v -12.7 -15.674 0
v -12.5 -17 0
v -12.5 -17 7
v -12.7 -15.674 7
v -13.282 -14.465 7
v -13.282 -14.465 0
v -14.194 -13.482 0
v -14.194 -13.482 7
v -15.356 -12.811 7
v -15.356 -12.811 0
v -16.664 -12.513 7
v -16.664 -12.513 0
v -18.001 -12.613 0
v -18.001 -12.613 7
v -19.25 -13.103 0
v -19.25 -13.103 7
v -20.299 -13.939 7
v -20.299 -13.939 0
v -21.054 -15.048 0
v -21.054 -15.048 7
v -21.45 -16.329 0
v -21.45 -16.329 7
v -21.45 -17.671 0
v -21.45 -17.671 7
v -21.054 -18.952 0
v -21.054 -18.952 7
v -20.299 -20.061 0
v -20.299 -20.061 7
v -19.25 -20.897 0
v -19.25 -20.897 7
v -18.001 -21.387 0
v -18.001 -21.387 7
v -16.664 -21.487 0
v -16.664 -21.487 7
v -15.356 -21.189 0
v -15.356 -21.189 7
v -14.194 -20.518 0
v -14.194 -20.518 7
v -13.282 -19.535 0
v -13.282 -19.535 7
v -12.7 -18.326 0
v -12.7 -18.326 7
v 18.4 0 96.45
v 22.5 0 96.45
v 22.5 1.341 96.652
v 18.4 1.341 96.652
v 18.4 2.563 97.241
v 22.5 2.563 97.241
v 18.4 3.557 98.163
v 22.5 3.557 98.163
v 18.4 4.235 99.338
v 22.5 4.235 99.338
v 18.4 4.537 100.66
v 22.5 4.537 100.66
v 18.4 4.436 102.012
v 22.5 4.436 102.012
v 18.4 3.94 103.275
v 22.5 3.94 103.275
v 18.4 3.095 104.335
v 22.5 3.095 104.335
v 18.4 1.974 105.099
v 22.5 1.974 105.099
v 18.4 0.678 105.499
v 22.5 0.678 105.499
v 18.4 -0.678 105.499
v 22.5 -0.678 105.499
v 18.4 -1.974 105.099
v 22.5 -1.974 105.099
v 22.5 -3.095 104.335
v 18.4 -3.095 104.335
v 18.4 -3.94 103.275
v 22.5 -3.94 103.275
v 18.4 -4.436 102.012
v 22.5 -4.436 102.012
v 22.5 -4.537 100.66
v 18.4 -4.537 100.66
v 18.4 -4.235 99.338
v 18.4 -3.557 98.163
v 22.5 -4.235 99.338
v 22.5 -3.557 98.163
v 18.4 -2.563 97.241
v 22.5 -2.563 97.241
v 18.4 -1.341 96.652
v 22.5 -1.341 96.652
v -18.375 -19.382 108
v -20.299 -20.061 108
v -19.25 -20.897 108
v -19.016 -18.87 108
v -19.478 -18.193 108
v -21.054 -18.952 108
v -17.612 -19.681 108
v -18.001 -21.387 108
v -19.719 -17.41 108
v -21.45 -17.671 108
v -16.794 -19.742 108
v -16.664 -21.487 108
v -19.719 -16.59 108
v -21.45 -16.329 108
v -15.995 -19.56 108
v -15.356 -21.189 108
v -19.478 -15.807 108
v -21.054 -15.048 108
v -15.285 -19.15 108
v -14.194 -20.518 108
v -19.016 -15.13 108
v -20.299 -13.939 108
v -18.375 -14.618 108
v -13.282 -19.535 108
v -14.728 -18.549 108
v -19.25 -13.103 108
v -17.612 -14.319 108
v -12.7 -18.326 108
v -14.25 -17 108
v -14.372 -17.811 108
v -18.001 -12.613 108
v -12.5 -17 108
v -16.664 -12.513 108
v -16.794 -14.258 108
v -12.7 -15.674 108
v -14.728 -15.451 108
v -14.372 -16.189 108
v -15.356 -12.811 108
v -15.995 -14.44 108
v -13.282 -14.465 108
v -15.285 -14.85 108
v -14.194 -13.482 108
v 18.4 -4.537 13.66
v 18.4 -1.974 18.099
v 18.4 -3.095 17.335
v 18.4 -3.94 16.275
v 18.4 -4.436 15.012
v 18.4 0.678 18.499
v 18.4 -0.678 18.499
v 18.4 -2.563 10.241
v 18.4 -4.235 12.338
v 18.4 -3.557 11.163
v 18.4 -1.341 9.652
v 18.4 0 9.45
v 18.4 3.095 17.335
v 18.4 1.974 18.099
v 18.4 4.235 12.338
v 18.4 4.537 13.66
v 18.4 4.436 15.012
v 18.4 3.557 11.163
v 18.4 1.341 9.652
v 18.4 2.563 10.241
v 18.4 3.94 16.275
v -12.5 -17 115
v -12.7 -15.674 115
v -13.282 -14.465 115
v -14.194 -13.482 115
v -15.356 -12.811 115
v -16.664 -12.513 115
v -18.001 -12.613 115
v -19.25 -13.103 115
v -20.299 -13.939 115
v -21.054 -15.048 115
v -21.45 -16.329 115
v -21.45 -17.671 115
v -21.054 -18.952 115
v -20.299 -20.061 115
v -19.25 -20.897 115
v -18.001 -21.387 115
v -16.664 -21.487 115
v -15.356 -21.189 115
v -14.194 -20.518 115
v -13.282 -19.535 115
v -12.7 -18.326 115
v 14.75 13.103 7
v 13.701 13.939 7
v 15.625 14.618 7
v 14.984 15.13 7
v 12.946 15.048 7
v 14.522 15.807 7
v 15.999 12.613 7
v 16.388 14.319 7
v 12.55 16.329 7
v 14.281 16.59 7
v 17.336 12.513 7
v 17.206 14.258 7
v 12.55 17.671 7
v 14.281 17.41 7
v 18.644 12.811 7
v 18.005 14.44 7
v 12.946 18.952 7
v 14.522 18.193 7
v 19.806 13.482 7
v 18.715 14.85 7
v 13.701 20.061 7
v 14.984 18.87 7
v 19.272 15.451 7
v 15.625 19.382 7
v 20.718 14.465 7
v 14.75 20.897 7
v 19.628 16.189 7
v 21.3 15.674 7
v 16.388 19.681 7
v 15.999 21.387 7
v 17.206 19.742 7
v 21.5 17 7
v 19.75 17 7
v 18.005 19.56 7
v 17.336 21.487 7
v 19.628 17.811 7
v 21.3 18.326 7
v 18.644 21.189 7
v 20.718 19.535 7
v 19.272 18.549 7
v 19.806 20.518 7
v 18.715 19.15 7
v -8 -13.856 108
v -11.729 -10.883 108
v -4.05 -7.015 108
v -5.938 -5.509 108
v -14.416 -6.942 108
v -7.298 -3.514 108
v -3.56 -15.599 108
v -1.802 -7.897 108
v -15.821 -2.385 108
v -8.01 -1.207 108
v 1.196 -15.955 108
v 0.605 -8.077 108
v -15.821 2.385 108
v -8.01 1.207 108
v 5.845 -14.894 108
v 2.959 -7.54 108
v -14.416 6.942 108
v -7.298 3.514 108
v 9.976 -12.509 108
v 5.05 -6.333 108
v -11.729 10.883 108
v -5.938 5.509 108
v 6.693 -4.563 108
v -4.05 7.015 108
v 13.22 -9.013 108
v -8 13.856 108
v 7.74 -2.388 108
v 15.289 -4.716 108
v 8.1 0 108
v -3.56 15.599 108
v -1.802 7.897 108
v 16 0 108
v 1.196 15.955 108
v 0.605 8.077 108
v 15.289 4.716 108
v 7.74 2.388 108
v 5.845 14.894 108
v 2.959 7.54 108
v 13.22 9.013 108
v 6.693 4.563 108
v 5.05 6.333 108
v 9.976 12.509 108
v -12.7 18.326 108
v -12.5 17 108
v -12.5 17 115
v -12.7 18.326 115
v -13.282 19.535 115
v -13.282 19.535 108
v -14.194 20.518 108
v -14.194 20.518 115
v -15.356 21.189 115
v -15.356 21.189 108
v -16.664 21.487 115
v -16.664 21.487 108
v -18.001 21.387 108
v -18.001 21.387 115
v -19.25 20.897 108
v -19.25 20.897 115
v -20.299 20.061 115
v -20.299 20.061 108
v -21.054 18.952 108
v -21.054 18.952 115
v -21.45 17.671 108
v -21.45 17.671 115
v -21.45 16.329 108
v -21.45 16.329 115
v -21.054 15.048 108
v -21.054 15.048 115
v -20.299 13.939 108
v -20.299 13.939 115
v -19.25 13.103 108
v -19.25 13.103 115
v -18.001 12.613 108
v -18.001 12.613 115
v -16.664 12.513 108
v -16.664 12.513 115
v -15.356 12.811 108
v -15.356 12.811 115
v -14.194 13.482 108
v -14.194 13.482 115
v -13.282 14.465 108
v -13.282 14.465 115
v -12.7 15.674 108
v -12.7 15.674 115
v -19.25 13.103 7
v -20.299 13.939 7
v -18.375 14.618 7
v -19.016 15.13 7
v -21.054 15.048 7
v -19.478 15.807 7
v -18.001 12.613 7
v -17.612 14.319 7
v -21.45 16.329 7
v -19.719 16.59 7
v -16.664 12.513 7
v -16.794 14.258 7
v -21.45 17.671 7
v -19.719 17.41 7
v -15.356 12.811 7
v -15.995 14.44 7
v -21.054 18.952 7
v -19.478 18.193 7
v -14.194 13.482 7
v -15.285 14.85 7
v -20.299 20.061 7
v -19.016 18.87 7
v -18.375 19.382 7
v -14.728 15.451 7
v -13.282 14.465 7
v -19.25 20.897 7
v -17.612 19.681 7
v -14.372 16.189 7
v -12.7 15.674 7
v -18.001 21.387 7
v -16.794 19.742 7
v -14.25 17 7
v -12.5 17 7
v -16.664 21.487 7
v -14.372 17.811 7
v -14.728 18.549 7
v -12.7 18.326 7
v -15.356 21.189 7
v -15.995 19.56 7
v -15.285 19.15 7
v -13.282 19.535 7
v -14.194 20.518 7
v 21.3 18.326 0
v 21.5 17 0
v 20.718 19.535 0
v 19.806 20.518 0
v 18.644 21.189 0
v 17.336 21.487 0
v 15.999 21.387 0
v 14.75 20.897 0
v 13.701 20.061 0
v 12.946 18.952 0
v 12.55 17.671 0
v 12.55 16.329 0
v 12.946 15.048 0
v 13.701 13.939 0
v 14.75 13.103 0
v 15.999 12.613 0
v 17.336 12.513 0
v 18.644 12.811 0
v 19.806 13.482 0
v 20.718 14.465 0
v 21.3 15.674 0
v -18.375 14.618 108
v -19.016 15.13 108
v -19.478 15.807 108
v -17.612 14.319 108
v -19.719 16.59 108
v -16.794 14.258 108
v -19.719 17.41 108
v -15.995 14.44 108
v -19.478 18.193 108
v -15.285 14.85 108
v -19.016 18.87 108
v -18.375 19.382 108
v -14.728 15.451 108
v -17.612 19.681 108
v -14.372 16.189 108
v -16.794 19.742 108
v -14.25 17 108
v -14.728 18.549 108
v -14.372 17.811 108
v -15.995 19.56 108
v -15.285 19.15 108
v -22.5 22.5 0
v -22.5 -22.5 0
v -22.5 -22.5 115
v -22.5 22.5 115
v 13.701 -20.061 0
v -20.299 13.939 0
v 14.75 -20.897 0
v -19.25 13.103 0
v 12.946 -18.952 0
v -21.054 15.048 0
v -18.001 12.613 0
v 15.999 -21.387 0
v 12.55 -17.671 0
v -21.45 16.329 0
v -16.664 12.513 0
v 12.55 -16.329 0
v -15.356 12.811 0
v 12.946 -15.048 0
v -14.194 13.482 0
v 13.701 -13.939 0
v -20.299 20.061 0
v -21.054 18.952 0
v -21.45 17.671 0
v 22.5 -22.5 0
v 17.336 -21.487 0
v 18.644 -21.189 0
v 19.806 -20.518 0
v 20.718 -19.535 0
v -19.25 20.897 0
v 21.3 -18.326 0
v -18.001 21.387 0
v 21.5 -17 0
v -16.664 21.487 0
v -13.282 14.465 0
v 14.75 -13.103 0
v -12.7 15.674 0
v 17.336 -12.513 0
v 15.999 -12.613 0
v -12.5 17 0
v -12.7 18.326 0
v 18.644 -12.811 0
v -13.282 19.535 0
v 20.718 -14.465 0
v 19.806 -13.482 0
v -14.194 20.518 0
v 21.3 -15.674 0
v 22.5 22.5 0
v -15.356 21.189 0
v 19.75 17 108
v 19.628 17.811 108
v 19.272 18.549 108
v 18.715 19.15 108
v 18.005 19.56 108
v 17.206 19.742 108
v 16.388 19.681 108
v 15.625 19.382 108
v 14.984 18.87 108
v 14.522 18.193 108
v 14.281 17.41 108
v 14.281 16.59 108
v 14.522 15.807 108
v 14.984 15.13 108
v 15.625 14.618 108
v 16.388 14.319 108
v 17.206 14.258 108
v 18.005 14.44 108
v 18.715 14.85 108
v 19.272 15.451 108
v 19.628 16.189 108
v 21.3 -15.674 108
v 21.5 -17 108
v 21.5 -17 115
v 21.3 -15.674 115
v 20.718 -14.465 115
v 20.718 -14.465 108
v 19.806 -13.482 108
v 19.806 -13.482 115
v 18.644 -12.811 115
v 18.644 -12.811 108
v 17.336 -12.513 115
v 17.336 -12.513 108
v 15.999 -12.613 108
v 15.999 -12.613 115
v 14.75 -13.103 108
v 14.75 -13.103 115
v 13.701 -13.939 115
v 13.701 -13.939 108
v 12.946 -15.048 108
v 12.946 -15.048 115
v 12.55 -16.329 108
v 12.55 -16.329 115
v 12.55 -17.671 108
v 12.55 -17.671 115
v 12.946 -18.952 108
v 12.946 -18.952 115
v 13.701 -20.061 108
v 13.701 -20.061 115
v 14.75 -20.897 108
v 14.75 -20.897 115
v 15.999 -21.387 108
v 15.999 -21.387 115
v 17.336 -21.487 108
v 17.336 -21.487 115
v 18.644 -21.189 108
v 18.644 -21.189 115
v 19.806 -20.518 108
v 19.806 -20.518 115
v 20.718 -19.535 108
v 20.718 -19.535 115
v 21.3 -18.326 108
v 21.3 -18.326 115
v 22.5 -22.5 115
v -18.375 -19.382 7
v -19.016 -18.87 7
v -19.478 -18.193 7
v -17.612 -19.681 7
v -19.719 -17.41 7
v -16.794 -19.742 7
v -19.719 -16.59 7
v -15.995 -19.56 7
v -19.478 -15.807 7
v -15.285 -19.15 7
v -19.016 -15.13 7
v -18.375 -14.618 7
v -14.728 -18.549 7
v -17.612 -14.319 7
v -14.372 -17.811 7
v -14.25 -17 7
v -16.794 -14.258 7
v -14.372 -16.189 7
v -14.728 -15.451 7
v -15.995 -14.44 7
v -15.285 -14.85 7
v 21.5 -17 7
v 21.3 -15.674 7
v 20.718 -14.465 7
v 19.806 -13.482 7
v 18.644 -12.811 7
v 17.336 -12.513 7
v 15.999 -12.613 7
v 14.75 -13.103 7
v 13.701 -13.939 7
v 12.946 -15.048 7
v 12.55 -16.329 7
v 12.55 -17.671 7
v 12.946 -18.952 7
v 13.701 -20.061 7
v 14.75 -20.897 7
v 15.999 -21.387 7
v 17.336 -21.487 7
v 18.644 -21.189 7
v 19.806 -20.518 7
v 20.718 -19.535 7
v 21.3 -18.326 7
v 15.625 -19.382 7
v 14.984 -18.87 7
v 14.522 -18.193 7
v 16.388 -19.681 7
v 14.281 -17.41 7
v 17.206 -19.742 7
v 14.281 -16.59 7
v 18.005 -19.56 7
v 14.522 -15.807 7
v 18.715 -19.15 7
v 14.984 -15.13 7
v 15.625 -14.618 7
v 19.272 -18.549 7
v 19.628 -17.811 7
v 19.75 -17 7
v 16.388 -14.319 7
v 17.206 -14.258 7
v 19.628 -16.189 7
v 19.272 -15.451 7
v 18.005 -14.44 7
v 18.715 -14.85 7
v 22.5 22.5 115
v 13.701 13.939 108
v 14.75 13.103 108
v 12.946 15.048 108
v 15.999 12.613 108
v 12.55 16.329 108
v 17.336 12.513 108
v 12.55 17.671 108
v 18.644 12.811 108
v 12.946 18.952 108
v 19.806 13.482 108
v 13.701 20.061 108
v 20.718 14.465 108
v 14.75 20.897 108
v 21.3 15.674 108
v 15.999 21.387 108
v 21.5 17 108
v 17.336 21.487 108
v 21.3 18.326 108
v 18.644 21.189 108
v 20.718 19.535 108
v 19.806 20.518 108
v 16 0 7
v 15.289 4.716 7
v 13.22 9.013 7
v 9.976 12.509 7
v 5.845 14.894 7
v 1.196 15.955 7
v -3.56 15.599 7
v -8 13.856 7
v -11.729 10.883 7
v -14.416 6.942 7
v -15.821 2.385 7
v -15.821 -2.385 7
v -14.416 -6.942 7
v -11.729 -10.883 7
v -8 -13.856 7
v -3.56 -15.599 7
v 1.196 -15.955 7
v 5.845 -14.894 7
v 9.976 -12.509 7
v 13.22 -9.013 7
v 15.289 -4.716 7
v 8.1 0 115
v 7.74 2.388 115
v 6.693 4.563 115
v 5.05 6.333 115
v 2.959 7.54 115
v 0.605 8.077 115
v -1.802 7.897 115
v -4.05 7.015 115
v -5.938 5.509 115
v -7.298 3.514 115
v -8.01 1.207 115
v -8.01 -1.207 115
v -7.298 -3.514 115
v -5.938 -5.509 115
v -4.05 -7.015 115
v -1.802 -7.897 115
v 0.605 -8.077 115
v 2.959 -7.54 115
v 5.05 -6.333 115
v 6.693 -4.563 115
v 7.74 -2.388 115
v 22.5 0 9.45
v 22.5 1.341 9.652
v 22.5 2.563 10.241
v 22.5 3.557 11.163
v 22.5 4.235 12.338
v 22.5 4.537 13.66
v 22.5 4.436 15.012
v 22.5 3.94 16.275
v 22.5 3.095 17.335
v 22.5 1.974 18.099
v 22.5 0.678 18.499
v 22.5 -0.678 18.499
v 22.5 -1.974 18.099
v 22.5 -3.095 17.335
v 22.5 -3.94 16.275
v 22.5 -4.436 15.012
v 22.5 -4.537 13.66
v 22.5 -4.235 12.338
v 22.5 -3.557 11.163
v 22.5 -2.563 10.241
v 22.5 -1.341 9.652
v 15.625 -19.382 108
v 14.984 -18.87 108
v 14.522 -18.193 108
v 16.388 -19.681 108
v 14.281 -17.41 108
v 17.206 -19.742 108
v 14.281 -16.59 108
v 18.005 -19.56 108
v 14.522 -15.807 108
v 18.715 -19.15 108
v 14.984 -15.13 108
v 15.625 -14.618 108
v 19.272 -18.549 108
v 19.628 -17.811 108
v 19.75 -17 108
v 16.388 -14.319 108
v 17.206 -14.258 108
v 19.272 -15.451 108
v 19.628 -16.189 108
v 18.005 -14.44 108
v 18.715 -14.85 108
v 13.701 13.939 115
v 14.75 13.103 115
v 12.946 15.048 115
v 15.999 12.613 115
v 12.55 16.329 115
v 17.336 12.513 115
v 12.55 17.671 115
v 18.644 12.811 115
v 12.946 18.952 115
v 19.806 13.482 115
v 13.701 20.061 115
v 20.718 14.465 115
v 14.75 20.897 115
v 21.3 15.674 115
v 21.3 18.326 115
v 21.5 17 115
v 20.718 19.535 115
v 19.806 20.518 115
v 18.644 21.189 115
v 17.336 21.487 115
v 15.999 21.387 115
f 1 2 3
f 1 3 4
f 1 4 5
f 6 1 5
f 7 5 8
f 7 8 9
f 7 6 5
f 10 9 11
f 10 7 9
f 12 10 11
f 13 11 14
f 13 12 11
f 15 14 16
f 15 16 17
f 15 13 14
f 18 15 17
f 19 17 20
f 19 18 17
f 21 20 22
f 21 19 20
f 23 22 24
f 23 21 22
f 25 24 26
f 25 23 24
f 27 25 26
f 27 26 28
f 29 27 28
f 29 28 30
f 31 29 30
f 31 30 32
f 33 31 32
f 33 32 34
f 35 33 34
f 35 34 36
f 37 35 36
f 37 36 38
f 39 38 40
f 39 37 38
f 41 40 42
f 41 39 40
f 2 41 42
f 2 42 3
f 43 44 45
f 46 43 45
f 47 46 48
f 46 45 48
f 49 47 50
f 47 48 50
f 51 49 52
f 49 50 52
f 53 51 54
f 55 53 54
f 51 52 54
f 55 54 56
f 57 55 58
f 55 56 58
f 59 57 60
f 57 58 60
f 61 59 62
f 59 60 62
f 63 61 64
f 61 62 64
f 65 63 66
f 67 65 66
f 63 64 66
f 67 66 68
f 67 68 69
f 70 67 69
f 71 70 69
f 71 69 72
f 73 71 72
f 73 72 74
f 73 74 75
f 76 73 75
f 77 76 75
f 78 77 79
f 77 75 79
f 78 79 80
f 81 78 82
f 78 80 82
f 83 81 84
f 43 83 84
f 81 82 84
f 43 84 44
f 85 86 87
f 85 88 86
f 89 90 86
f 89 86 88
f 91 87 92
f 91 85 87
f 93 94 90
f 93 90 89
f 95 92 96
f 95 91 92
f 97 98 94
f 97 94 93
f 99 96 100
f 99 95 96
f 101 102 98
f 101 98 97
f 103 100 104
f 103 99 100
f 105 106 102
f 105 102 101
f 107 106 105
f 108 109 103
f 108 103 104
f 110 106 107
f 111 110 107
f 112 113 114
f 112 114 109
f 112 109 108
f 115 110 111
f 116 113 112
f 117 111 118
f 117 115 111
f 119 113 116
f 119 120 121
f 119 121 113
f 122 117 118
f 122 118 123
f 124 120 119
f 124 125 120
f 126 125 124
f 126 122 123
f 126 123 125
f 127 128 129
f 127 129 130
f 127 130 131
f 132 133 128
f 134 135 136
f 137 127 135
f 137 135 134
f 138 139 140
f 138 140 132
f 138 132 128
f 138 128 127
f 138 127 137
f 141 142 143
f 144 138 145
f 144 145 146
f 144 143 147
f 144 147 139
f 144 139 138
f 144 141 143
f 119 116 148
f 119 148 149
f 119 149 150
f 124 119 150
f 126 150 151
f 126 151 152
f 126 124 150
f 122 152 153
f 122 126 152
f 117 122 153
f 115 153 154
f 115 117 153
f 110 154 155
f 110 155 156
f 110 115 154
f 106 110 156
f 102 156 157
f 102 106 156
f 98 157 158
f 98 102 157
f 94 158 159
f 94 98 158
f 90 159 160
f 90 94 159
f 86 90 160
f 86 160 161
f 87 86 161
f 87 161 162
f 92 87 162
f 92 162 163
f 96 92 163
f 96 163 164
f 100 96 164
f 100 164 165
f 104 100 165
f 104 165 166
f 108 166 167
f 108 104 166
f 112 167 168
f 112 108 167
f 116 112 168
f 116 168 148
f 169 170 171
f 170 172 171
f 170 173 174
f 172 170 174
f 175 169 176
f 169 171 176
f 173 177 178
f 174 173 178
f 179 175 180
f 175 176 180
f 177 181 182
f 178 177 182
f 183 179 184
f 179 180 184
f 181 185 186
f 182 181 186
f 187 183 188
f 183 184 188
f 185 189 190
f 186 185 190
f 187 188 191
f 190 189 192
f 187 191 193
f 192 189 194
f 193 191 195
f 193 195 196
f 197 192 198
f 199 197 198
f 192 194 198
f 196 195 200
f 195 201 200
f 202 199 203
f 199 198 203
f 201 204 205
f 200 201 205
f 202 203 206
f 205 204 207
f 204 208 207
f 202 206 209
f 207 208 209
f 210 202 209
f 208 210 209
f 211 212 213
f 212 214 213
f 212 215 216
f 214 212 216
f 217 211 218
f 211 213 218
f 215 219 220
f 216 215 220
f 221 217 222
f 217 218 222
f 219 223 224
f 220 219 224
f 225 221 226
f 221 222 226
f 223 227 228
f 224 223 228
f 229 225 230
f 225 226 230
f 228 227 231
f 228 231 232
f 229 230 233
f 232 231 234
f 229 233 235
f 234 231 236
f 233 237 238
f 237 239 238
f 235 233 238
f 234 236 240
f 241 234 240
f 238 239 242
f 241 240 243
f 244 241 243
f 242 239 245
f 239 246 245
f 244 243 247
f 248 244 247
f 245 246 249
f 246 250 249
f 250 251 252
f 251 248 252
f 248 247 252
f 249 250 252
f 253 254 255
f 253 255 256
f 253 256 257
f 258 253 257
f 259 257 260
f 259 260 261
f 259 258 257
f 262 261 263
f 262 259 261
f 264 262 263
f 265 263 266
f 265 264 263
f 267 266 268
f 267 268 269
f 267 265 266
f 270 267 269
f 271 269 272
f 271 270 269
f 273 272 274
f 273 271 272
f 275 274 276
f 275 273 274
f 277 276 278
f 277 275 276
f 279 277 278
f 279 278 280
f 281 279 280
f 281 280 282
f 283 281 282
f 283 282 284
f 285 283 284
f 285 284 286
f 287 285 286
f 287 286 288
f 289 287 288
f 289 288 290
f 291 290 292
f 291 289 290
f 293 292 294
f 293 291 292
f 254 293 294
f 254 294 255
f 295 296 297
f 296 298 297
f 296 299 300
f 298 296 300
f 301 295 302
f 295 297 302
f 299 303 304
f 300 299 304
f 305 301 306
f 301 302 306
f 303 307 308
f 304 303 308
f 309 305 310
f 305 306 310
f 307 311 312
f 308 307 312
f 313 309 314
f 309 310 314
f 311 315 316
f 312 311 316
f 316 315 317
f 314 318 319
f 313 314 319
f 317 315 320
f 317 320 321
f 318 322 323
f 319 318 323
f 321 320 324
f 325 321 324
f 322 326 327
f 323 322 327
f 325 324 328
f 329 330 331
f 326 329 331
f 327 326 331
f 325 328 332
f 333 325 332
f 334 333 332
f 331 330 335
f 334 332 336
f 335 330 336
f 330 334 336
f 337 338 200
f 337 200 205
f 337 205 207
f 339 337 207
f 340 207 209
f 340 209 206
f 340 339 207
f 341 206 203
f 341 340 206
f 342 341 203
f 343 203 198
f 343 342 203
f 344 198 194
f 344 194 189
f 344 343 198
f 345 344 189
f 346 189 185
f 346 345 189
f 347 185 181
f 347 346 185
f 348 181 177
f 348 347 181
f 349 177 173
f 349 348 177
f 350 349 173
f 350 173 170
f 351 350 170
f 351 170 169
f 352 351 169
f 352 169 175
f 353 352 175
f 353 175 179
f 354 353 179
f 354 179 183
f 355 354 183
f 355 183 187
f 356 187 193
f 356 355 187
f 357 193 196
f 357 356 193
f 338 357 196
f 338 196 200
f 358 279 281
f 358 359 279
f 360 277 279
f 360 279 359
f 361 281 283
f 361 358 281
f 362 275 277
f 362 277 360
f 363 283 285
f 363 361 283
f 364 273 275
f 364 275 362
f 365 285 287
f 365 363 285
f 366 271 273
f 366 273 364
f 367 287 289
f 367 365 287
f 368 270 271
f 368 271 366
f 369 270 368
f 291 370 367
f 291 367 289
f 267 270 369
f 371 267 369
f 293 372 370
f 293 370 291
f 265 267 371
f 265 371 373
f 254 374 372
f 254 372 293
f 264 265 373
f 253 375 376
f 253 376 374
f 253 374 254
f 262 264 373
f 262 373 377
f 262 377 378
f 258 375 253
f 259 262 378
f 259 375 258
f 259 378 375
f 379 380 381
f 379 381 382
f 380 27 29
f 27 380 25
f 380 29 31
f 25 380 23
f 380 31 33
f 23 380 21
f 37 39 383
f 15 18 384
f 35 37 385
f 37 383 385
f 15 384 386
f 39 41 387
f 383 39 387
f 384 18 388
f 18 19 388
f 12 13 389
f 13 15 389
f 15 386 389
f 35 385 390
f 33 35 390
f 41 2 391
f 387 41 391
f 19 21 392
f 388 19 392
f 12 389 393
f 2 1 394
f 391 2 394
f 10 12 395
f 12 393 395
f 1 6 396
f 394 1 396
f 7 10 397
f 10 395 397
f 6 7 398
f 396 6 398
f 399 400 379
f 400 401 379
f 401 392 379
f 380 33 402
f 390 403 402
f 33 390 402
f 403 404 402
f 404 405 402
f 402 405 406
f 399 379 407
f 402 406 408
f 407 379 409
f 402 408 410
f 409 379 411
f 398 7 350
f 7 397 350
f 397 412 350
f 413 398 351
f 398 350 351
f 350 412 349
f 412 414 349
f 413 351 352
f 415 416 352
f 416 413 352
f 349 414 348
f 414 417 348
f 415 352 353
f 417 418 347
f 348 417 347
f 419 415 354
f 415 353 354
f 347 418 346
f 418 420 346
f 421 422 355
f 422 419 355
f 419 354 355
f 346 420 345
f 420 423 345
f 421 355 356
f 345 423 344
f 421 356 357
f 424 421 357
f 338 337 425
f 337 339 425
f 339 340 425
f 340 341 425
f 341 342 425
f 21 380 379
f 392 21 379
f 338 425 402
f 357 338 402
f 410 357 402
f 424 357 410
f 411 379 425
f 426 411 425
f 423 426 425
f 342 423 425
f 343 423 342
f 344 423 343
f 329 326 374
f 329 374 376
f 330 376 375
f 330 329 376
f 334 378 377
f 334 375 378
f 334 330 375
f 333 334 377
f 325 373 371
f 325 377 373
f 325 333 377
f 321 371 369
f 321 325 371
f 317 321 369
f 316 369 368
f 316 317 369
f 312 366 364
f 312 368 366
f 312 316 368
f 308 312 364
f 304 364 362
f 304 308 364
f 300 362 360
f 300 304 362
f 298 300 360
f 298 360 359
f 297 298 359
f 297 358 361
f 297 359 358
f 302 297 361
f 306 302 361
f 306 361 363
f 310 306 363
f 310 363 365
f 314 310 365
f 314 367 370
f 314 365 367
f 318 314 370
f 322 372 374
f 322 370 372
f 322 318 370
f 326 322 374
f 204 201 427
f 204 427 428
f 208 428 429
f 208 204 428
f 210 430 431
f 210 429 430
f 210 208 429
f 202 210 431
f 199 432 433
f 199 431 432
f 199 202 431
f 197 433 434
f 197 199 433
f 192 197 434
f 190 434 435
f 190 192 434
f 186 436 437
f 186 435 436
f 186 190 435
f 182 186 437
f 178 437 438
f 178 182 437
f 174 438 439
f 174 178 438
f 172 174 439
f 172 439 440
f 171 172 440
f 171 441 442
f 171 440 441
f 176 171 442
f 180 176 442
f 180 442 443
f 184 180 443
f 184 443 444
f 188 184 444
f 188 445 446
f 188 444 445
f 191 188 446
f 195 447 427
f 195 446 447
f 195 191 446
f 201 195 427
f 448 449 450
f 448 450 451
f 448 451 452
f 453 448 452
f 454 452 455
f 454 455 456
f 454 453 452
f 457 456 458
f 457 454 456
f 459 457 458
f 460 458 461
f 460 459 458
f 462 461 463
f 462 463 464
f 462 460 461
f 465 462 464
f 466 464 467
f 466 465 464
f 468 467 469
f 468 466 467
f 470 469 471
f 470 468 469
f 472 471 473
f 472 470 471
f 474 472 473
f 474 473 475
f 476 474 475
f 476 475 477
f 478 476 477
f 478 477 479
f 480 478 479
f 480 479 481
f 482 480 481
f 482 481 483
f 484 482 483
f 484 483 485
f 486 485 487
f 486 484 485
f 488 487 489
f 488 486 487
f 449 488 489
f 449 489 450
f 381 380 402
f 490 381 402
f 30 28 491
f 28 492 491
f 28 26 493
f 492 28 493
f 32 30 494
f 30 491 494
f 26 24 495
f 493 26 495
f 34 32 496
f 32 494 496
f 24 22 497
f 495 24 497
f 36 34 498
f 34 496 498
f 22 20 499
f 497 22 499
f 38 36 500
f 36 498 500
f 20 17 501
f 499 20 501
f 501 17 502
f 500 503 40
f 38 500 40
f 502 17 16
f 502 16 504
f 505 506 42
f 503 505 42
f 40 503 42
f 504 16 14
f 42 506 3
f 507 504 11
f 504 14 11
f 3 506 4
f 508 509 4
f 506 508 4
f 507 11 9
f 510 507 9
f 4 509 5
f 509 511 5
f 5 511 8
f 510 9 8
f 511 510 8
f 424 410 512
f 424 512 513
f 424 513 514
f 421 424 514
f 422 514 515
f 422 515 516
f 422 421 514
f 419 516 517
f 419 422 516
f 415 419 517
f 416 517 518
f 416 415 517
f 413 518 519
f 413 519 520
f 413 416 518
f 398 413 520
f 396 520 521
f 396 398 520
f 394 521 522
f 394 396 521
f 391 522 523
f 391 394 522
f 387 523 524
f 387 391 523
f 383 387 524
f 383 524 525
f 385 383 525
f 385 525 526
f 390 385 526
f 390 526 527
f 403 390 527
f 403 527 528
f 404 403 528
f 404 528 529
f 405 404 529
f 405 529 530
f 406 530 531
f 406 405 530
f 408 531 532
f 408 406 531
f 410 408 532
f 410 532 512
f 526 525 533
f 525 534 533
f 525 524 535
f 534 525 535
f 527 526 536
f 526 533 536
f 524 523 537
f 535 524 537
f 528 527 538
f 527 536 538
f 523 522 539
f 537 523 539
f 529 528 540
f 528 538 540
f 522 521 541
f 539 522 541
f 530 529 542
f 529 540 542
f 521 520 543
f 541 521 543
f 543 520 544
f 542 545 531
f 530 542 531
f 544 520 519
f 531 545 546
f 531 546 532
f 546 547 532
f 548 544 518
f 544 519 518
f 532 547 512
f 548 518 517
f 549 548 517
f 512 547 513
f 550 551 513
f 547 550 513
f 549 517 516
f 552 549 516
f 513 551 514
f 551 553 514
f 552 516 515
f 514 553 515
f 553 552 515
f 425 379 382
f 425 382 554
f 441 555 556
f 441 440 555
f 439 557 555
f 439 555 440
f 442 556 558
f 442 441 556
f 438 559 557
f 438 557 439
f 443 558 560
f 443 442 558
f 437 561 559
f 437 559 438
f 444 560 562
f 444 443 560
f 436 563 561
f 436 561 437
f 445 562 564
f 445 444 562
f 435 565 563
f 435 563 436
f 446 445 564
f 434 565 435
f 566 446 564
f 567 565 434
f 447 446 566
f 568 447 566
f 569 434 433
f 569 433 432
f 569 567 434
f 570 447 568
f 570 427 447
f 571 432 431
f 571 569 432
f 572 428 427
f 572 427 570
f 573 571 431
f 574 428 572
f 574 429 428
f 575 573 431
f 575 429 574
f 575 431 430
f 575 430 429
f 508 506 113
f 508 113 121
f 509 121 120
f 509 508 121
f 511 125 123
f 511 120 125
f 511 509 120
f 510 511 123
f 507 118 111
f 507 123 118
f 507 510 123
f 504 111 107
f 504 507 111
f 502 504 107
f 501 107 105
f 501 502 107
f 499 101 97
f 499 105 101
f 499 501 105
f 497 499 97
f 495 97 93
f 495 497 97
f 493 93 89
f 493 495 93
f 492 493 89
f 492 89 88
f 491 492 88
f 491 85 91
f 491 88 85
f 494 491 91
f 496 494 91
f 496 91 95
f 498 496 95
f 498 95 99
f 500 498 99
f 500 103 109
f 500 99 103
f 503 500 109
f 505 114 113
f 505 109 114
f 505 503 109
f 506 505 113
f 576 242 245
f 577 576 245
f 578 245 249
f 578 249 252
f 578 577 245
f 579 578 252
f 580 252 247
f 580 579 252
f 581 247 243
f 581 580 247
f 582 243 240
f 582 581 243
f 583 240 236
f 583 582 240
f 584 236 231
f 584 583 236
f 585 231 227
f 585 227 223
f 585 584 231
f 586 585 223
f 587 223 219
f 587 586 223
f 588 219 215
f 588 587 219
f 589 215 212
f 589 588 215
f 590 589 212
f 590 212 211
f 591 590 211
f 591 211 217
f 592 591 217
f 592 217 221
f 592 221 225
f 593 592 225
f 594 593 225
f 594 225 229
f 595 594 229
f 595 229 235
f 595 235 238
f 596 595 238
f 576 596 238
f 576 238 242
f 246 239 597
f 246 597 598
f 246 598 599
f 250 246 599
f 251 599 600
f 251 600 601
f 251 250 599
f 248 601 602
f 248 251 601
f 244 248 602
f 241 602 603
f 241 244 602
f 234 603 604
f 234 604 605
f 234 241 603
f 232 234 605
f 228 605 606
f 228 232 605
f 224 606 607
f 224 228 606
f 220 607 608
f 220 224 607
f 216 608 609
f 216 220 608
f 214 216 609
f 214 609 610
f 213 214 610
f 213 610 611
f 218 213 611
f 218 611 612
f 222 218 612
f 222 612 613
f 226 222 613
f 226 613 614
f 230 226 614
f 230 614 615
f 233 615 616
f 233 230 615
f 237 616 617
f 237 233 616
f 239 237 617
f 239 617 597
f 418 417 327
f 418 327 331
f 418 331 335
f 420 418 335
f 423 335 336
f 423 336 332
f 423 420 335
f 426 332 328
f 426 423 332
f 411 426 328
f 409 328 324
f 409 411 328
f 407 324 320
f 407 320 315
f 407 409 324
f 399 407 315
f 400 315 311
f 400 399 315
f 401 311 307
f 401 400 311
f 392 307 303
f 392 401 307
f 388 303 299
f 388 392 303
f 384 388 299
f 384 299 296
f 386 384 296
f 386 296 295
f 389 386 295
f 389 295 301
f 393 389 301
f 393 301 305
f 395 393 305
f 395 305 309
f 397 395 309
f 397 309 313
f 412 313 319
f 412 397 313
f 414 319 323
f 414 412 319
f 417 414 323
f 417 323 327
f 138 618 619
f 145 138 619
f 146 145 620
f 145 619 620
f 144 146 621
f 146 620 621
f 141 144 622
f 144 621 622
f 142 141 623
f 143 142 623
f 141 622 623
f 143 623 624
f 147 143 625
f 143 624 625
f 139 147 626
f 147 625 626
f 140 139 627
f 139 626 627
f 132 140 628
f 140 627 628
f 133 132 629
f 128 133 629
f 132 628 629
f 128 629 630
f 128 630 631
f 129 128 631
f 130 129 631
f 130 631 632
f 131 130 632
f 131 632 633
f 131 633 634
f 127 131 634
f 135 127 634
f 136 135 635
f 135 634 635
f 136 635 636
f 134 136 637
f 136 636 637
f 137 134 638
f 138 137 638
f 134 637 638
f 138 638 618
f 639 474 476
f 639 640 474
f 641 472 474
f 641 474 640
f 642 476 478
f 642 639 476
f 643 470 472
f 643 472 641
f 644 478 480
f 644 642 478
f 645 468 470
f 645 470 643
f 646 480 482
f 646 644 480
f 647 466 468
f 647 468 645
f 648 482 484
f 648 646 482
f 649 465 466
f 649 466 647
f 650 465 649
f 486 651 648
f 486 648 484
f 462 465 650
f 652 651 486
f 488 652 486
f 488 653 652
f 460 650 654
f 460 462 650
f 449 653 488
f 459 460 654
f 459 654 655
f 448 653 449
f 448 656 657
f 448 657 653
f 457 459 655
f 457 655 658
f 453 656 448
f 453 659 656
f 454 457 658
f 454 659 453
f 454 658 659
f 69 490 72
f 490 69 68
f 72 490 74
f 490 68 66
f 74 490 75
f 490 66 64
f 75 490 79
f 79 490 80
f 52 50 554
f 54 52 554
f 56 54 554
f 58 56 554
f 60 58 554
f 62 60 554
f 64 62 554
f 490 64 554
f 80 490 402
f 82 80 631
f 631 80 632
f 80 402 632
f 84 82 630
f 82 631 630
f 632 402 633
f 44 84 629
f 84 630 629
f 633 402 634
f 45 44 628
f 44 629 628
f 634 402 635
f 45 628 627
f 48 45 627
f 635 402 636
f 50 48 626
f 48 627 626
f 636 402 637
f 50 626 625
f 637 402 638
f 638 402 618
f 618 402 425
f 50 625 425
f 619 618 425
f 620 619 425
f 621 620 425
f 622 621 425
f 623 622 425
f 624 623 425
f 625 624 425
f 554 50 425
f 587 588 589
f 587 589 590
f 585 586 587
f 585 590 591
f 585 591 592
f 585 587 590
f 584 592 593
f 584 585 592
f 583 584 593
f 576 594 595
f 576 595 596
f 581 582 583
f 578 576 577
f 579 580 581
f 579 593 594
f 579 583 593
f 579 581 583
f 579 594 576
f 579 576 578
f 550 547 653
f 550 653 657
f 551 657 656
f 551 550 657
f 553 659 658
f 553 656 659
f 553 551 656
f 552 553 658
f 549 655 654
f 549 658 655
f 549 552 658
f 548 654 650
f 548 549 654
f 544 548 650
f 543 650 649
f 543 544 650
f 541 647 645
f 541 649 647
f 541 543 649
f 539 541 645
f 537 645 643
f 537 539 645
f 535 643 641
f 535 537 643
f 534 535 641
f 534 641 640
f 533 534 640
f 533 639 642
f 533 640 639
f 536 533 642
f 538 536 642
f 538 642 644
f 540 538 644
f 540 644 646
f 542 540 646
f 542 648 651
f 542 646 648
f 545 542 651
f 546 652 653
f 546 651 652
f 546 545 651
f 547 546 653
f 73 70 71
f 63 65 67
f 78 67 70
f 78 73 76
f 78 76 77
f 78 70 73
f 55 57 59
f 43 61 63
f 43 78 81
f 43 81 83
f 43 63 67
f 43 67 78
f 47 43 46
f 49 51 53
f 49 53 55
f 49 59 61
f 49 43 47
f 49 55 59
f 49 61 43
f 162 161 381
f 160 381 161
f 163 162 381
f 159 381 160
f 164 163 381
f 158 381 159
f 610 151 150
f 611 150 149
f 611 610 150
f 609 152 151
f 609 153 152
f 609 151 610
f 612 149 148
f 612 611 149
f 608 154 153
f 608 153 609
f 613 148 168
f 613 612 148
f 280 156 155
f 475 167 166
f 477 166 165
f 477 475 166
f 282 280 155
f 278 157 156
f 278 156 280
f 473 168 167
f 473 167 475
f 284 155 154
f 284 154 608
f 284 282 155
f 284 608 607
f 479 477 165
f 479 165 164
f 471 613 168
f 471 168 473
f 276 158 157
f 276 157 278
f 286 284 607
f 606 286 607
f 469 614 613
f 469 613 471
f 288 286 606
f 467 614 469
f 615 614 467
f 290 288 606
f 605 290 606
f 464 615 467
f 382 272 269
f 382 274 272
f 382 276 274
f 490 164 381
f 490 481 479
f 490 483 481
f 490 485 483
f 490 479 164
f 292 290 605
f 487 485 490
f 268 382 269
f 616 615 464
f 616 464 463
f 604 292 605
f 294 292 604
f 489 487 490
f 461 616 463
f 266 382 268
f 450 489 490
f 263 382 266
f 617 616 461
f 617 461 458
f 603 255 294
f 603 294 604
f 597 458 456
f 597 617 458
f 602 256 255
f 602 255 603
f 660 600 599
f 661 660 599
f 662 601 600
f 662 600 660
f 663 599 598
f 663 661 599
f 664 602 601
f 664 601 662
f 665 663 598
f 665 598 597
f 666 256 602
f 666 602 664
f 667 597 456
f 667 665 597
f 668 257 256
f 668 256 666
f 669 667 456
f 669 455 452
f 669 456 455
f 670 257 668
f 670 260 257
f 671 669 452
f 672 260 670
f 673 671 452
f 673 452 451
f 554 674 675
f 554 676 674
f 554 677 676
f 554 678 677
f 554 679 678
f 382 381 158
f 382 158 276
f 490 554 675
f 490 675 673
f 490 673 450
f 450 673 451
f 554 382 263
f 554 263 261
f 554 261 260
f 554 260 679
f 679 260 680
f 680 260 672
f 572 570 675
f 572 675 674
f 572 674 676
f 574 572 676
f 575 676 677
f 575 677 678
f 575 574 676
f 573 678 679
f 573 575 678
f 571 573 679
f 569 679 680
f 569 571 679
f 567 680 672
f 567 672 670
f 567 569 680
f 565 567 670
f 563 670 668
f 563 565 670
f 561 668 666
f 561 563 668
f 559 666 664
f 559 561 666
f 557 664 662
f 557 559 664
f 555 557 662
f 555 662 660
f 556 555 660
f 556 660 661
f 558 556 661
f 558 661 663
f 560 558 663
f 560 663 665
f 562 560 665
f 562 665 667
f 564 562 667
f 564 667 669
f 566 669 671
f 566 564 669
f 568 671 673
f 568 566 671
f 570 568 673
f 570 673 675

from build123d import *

# Parameters (mm, degrees)
SKETCH1_W                                      = 45
SKETCH1_H                                      = 45
SKETCH1_R                                      = 2.75
SKETCH1_R_2                                    = 16
SMC_45_MM_SQUARE_BODY_AND_FOUR_5_5_MM_TH_DEPTH = 115
SKETCH2_R                                      = 16
HEAD_END_CLEARANCE_ENVELOPE_DEPTH              = 7
ROD_START                                      = 108
SKETCH3_R                                      = 16
SKETCH3_R_2                                    = 8.1
ROD_COVER_AND_16_MM_ROD_CLEARANCE_DEPTH        = 7
SKETCH4_R                                      = 4.5
REAR_BOLT_HEAD_COUNTERBORES_DEPTH              = 7
FRONT_START                                    = 108
SKETCH5_R                                      = 4.5
FRONT_MOUNTING_COUNTERBORES_DEPTH              = 7
TOP_START                                      = 22.5
SKETCH6_R                                      = 4.55
TOP_RC_1_8_PORT_CLEARANCE_FOR_LAYOUT_DEPTH     = 4.1


with BuildPart() as part:
    # Sketch1 → SMC 45 mm square body and four 5.5 mm through holes (new body)
    with BuildSketch(Plane.XY):
        Rectangle(SKETCH1_W, SKETCH1_H)
        with Locations((-17, -17)):
            Circle(SKETCH1_R, mode=Mode.SUBTRACT)
        with Locations((-17, 17)):
            Circle(SKETCH1_R, mode=Mode.SUBTRACT)
        with Locations((17, -17)):
            Circle(SKETCH1_R, mode=Mode.SUBTRACT)
        with Locations((17, 17)):
            Circle(SKETCH1_R, mode=Mode.SUBTRACT)
        Circle(SKETCH1_R_2, mode=Mode.SUBTRACT)
    extrude(amount=SMC_45_MM_SQUARE_BODY_AND_FOUR_5_5_MM_TH_DEPTH)

    # Sketch2 → Head end clearance envelope (add)
    with BuildSketch(Plane.XY):
        Circle(SKETCH2_R)
    extrude(amount=HEAD_END_CLEARANCE_ENVELOPE_DEPTH)

    # Sketch3 → Rod cover and 16 mm rod clearance (add)
    with BuildSketch(Plane.XY.offset(ROD_START)):
        Circle(SKETCH3_R)
        Circle(SKETCH3_R_2, mode=Mode.SUBTRACT)
    extrude(amount=ROD_COVER_AND_16_MM_ROD_CLEARANCE_DEPTH)

    # Sketch4 → Rear bolt head counterbores (cut)
    with BuildSketch(Plane.XY):
        with Locations((-17, -17)):
            Circle(SKETCH4_R)
        with Locations((-17, 17)):
            Circle(SKETCH4_R)
        with Locations((17, -17)):
            Circle(SKETCH4_R)
        with Locations((17, 17)):
            Circle(SKETCH4_R)
    extrude(amount=REAR_BOLT_HEAD_COUNTERBORES_DEPTH, mode=Mode.SUBTRACT)

    # Sketch5 → Front mounting counterbores (cut)
    with BuildSketch(Plane.XY.offset(FRONT_START)):
        with Locations((-17, -17)):
            Circle(SKETCH5_R)
        with Locations((-17, 17)):
            Circle(SKETCH5_R)
        with Locations((17, -17)):
            Circle(SKETCH5_R)
        with Locations((17, 17)):
            Circle(SKETCH5_R)
    extrude(amount=FRONT_MOUNTING_COUNTERBORES_DEPTH, mode=Mode.SUBTRACT)

    # Sketch6 → Top Rc 1/8 port clearance for layout (cut)
    with BuildSketch(Plane(origin=(0, 0, 0), x_dir=(0, 0, -1), z_dir=(1, 0, 0)).offset(TOP_START)):
        with Locations((-14, 0)):
            Circle(SKETCH6_R)
        with Locations((-101, 0)):
            Circle(SKETCH6_R)
    extrude(amount=-TOP_RC_1_8_PORT_CLEARANCE_FOR_LAYOUT_DEPTH, mode=Mode.SUBTRACT)


solid = part.part
